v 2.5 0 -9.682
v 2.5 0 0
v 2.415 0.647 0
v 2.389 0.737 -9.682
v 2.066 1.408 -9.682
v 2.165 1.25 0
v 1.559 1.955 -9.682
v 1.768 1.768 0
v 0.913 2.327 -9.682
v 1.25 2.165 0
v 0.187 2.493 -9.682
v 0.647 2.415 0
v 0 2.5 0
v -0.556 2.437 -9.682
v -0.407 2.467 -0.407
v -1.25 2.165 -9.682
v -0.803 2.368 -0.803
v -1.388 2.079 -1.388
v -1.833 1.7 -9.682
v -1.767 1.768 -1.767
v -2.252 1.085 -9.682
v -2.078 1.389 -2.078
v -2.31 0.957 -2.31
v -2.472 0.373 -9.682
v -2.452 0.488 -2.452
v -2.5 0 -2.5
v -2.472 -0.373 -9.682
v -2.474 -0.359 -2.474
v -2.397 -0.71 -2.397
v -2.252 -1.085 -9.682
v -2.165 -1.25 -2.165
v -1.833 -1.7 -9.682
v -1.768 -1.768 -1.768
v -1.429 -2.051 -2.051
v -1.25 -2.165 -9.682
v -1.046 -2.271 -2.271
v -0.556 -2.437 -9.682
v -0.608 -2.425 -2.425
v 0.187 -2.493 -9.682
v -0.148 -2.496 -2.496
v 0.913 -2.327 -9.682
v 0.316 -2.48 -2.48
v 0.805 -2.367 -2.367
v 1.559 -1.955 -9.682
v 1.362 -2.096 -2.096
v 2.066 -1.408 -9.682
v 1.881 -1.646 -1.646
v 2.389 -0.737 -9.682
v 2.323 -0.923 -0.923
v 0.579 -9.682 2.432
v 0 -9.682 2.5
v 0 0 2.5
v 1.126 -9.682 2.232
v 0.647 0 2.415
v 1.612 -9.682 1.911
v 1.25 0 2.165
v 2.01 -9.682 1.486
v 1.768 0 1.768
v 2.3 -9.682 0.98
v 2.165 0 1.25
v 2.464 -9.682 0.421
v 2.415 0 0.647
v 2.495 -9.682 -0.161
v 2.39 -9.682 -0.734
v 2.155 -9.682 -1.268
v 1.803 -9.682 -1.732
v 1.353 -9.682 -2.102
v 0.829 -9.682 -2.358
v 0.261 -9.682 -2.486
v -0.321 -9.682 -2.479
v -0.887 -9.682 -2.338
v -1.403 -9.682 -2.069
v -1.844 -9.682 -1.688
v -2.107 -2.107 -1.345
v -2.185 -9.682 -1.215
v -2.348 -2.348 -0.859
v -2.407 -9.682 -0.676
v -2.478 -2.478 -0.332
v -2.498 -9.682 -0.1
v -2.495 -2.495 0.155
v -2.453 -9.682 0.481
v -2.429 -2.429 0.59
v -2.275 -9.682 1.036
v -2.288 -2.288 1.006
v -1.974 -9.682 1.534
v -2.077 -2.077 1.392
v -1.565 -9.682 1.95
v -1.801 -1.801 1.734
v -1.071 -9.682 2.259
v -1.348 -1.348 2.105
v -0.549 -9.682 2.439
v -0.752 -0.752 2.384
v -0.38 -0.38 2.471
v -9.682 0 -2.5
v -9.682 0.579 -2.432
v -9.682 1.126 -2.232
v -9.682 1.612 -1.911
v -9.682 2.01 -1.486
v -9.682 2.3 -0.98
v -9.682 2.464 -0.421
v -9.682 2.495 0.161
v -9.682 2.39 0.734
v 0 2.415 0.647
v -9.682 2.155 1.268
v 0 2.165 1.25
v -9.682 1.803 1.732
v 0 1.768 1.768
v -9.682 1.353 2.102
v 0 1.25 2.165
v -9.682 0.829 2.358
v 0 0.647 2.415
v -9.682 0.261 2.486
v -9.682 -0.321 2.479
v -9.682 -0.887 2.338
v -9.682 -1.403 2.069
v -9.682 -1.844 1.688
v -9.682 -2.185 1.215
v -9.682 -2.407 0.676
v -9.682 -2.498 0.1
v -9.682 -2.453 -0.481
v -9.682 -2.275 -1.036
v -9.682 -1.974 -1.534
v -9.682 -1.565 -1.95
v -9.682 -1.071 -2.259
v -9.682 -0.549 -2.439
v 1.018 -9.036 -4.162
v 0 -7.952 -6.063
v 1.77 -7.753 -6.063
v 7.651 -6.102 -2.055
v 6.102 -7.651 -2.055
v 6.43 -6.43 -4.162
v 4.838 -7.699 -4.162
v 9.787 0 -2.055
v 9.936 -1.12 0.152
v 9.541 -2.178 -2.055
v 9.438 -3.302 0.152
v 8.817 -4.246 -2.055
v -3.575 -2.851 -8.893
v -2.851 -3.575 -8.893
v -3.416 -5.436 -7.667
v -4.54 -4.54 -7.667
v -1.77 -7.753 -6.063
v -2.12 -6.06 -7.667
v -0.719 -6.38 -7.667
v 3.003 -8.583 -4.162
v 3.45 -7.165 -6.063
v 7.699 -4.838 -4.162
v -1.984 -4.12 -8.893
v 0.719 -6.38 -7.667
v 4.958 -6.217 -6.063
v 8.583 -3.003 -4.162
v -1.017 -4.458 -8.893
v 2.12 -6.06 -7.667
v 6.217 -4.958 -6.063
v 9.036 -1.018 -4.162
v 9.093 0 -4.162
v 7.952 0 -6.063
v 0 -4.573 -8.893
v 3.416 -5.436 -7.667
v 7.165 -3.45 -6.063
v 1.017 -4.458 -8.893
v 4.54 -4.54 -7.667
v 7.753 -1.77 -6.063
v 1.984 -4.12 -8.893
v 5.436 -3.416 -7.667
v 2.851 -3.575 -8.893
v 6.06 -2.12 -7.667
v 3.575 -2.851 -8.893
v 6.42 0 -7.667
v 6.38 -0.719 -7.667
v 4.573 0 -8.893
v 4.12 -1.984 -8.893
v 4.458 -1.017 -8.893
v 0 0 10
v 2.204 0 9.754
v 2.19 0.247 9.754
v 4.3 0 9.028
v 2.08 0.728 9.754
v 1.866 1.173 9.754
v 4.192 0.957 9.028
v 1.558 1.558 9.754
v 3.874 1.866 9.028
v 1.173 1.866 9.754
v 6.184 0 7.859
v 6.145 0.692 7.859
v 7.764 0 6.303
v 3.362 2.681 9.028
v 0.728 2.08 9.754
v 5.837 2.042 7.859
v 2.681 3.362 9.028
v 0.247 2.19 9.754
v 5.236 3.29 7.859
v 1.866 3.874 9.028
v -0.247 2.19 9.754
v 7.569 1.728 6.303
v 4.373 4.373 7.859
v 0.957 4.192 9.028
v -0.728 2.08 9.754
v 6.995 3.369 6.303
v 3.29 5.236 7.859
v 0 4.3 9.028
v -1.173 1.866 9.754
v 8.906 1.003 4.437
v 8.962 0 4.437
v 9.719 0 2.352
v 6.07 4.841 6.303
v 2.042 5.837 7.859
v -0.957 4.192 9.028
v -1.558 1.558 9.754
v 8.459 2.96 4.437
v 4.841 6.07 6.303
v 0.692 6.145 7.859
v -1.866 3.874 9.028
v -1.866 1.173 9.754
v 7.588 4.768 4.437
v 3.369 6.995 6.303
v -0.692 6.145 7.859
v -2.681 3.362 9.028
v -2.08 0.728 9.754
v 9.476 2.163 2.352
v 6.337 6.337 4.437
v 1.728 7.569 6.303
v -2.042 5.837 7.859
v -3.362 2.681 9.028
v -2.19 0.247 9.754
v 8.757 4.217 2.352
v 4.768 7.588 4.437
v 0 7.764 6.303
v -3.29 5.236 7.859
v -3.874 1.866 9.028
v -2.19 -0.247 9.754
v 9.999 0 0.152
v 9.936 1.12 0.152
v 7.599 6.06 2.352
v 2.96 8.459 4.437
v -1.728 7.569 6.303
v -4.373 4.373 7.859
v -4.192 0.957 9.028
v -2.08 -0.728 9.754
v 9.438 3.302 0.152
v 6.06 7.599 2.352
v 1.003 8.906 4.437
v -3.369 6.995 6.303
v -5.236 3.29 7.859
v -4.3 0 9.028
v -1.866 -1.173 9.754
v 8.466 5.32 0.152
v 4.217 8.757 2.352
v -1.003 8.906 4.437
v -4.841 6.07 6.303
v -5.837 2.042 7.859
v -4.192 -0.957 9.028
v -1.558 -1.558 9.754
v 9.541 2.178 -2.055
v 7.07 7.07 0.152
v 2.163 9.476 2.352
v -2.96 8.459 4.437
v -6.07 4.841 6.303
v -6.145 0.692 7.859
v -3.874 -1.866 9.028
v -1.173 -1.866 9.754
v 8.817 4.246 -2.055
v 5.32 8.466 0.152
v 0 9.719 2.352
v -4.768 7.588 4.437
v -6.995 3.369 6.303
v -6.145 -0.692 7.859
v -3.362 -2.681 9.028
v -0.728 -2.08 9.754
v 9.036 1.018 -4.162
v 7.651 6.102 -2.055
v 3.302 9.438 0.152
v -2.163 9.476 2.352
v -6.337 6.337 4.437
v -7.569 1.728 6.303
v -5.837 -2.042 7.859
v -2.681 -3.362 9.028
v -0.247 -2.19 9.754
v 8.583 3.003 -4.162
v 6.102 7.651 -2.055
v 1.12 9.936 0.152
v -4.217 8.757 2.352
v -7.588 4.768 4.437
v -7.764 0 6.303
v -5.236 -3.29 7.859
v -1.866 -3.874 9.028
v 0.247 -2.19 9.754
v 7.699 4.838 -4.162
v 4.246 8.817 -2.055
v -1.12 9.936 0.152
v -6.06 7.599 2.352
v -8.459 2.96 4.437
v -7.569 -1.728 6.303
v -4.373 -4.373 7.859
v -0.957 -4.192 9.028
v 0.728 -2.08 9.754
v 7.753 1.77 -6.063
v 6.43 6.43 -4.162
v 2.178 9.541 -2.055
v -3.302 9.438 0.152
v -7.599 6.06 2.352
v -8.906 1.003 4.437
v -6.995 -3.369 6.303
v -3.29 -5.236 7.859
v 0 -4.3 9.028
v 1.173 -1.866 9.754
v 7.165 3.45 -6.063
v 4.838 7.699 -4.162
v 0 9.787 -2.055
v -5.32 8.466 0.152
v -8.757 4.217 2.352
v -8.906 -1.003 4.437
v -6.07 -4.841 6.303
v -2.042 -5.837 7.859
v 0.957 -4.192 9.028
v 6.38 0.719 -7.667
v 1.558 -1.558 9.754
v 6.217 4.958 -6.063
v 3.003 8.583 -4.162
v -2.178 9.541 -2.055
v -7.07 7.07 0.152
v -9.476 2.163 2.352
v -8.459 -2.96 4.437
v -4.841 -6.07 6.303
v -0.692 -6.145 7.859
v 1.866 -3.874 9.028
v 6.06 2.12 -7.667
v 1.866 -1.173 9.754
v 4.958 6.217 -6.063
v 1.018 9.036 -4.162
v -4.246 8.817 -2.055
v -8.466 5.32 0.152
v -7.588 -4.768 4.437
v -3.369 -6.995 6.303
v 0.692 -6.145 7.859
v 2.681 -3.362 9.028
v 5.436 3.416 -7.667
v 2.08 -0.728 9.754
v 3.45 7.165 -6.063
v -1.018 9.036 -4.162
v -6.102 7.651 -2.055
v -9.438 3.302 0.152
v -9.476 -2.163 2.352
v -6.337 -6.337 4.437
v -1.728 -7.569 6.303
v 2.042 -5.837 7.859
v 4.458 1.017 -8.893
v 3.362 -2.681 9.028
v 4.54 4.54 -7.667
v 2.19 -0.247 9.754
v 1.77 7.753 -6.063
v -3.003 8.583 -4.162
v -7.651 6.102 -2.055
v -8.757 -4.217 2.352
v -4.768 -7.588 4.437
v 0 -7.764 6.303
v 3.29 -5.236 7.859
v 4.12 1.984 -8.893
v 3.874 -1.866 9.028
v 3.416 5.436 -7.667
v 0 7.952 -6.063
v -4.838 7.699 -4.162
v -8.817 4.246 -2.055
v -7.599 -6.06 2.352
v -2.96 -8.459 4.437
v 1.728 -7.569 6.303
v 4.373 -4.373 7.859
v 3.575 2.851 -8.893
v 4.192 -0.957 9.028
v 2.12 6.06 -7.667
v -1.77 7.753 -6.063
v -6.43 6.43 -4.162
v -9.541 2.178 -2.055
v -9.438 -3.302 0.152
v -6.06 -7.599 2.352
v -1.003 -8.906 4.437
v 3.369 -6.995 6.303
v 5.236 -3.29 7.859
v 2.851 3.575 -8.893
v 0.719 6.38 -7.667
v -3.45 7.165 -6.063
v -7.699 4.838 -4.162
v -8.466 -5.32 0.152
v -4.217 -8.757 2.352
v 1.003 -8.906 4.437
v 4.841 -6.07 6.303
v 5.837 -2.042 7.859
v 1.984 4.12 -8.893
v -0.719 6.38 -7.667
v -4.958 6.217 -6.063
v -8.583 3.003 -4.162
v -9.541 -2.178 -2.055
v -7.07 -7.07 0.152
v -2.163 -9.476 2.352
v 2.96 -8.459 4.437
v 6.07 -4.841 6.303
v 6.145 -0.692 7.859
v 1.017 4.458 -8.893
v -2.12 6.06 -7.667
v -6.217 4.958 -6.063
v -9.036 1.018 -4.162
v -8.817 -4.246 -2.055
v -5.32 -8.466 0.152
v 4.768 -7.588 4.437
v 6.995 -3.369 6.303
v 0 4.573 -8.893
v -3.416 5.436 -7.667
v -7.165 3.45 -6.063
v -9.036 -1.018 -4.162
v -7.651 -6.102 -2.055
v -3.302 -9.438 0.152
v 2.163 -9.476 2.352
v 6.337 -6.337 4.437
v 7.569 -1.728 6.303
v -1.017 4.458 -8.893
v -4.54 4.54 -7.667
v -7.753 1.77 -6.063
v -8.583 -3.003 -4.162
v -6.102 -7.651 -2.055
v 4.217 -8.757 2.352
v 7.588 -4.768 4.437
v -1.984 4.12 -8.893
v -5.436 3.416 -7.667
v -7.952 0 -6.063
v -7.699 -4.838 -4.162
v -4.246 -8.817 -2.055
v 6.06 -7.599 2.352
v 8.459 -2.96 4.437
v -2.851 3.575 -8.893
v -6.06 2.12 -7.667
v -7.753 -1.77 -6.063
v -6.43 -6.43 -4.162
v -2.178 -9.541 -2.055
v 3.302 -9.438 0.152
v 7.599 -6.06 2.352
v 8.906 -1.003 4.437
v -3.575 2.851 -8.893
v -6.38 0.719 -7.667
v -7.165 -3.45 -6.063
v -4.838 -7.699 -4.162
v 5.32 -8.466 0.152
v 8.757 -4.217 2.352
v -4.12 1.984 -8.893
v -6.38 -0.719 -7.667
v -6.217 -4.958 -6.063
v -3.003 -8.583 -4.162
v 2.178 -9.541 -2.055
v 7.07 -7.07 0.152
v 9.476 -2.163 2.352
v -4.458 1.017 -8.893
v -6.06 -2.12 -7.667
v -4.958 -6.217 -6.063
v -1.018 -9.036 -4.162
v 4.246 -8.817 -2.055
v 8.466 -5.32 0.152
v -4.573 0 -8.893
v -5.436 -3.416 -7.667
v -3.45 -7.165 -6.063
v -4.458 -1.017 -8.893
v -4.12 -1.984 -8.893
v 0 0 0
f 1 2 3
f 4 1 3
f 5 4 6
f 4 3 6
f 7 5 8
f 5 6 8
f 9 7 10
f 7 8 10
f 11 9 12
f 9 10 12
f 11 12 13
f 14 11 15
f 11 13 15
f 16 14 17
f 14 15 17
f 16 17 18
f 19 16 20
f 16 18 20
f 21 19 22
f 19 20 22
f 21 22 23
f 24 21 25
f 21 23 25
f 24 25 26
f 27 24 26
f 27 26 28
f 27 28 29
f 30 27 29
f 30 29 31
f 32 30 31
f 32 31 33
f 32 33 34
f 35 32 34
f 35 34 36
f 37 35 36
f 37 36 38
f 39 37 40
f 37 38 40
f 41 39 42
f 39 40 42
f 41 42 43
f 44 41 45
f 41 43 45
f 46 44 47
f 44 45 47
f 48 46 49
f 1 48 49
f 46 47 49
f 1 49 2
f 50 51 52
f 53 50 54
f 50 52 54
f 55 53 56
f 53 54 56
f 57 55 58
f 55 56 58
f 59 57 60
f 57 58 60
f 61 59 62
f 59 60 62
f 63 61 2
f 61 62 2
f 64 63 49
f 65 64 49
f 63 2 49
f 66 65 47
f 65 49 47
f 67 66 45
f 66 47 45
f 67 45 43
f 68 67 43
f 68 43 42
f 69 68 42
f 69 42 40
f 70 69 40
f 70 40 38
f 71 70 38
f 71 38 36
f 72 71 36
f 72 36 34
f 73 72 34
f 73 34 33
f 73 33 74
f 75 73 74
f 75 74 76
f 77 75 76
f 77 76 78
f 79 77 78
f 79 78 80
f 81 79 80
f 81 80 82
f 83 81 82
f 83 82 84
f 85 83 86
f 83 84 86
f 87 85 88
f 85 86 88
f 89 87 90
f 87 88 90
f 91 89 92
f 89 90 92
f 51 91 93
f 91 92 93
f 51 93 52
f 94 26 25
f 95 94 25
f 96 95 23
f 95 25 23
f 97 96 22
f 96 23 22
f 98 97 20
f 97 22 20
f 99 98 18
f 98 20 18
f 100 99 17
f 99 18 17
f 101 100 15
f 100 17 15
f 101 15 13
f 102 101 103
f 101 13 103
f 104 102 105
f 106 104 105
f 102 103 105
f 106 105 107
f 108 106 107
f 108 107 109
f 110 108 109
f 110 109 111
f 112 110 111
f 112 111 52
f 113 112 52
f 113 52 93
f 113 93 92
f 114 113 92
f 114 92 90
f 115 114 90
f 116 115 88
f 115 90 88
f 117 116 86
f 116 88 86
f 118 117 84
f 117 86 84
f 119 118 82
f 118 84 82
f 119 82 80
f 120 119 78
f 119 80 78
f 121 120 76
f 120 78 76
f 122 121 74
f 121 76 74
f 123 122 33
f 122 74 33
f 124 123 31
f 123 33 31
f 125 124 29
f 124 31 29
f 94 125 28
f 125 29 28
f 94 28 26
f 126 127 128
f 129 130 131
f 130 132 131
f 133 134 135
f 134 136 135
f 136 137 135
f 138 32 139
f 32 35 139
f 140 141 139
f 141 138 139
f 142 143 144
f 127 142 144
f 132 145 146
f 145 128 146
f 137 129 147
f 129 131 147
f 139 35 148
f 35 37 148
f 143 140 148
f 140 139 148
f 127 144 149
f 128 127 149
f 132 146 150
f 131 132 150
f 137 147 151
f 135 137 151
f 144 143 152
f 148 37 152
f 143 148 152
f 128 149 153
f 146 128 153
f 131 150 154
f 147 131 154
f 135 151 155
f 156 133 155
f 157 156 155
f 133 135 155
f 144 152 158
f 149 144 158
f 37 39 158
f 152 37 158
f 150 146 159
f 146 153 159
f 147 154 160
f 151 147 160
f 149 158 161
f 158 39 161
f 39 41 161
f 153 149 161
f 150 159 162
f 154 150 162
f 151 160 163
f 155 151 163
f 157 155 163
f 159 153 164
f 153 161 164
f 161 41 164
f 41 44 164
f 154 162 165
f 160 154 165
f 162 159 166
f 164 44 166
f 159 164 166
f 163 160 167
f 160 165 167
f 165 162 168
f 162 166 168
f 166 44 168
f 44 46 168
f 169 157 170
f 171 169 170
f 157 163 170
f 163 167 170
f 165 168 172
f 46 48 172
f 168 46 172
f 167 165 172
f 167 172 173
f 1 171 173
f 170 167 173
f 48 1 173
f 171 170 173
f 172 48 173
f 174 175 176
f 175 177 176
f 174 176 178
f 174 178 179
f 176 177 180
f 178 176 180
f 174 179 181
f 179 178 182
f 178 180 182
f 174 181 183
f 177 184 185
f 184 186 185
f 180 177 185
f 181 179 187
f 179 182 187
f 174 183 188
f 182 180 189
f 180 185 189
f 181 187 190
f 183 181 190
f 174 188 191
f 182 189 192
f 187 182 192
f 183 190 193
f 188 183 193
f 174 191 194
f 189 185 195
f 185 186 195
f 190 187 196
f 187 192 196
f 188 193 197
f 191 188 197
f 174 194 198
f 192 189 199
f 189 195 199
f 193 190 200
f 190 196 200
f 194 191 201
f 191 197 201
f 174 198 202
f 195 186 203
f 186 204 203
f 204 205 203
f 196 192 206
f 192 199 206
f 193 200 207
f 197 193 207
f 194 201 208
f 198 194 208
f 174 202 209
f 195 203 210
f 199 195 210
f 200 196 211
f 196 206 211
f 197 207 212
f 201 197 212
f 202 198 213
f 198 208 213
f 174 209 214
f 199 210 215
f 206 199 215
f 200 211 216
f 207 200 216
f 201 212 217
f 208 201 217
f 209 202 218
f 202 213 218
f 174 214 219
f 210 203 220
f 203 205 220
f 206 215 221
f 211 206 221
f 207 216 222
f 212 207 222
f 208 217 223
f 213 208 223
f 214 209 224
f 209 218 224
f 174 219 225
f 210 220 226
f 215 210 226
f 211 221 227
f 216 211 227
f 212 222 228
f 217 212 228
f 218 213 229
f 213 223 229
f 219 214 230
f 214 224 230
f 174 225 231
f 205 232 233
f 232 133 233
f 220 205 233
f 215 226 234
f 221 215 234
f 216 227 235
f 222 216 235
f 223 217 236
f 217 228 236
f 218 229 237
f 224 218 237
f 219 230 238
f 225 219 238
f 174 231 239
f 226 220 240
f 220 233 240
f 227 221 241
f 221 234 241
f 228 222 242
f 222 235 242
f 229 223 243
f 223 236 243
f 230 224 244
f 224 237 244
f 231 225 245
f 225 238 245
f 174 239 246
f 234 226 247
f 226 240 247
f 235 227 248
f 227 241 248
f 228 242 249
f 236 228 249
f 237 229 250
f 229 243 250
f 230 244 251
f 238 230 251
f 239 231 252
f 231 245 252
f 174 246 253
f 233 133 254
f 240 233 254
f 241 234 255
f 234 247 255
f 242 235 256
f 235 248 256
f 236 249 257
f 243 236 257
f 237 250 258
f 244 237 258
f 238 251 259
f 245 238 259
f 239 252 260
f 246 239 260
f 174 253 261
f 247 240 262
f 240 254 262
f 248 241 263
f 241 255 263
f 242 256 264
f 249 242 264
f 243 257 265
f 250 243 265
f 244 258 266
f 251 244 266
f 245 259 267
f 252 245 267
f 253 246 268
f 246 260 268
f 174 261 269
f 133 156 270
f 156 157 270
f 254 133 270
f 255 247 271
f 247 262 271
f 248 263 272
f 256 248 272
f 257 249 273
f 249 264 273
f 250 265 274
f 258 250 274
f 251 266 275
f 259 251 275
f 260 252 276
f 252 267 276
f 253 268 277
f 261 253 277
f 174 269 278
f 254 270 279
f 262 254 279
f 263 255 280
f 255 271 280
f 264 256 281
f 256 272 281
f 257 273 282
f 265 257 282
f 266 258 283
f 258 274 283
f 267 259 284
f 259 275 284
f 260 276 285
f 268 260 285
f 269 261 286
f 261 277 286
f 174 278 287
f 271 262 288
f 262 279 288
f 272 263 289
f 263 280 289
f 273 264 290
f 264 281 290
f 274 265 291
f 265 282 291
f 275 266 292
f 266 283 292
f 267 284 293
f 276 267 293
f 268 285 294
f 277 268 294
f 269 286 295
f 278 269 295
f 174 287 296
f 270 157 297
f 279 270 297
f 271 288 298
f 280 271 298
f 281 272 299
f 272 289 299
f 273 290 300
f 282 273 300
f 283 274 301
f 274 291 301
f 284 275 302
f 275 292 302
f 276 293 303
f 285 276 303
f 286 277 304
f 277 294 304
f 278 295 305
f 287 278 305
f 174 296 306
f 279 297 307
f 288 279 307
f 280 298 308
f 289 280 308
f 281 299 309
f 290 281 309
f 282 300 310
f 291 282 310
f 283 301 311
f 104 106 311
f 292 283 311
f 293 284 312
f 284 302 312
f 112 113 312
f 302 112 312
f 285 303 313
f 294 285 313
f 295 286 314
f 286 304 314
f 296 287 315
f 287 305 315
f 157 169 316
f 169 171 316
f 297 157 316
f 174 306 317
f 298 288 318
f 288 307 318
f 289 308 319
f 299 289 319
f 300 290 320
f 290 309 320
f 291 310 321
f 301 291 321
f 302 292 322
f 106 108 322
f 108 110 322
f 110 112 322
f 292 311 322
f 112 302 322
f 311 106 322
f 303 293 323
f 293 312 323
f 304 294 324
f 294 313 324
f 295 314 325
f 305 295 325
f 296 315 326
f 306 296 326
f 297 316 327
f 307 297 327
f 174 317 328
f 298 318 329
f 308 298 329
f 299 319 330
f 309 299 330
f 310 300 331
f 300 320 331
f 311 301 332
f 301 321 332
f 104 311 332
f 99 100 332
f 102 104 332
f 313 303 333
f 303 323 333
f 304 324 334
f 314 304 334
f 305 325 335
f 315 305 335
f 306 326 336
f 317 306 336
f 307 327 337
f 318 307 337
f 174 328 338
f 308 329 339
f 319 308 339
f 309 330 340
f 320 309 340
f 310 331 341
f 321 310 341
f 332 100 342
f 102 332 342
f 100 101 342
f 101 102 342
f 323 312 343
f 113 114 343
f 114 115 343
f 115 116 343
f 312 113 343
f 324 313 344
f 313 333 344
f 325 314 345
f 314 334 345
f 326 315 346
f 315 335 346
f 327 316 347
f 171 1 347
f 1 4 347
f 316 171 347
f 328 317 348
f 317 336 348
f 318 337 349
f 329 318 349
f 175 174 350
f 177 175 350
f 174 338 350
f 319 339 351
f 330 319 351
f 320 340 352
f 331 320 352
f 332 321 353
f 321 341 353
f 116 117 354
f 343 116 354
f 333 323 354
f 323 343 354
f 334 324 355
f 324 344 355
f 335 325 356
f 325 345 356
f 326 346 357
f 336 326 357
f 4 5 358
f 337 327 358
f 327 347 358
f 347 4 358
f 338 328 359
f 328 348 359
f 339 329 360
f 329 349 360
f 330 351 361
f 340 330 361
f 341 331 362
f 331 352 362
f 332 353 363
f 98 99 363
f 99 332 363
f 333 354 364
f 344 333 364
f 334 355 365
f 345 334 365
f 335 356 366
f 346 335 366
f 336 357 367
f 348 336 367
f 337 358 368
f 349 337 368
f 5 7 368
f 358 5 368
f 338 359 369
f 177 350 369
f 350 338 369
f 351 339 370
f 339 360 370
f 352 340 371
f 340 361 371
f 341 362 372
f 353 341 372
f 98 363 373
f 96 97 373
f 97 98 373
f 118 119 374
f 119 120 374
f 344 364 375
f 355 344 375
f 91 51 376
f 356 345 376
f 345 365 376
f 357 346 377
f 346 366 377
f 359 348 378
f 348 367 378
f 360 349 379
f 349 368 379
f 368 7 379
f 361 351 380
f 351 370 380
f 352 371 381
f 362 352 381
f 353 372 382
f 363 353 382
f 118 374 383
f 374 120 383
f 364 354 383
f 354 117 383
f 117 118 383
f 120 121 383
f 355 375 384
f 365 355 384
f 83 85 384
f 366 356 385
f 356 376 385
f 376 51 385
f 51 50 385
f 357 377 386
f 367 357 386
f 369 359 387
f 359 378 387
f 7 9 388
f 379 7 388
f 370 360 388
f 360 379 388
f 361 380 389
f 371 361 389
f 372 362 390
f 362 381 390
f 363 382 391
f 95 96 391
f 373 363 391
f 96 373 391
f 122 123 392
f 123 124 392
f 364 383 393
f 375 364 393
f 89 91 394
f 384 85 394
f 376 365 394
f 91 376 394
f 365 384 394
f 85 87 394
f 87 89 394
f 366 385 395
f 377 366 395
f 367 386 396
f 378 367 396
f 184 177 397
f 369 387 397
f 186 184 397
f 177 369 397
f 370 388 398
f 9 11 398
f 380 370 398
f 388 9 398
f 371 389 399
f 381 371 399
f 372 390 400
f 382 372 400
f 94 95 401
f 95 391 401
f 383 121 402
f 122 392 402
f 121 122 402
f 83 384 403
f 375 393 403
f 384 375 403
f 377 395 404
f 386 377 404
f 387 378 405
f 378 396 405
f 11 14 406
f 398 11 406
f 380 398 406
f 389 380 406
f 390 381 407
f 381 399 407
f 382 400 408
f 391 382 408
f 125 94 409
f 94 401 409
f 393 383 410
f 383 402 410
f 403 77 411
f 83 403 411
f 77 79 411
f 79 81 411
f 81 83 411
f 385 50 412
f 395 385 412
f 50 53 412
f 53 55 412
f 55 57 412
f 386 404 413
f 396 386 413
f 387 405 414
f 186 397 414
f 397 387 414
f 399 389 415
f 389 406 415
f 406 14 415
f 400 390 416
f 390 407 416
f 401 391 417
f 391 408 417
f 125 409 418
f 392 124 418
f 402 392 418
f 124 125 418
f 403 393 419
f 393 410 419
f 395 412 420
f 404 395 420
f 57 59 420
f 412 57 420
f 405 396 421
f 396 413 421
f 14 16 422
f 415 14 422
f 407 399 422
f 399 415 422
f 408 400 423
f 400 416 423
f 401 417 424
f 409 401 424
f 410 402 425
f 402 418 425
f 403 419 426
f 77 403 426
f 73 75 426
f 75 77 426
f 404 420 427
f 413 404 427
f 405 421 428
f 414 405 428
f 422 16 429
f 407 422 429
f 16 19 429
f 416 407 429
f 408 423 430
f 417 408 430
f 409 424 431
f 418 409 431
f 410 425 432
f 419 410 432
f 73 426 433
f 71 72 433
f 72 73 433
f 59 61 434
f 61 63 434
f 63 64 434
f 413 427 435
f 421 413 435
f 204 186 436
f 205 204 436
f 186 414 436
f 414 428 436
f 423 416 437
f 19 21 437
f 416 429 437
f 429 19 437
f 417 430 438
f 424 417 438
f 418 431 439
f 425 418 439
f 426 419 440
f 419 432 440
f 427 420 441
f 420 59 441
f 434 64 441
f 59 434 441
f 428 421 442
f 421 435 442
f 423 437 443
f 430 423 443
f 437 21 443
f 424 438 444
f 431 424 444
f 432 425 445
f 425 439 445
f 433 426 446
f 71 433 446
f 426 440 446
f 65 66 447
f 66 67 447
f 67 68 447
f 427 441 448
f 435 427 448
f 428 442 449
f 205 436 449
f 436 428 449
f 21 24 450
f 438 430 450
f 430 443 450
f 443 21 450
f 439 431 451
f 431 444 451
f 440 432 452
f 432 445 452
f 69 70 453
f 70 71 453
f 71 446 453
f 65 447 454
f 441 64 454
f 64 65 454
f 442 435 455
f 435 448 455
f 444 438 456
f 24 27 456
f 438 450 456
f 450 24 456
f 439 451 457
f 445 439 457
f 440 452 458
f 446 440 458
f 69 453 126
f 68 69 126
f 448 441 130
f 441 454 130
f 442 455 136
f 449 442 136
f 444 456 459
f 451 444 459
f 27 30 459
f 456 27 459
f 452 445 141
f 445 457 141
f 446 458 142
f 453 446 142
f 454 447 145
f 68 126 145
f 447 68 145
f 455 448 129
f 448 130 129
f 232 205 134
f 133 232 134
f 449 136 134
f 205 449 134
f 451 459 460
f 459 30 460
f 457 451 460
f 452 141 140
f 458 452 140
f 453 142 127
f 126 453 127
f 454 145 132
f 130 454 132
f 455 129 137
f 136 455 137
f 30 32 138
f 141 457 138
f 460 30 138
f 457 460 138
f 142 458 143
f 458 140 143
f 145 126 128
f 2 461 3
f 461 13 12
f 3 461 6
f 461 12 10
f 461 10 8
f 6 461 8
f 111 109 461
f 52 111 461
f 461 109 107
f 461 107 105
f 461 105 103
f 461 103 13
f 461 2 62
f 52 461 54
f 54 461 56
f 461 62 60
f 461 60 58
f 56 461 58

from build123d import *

# Parameters (mm, degrees)
SKETCH_2_R          = 2.5
CUT_EXTRUDE_1_DEPTH = 18.320508076
SKETCH_3_R          = 2.5
CUT_EXTRUDE_2_DEPTH = 18.320508076
SKETCH_4_R          = 2.5
CUT_EXTRUDE_3_DEPTH = 18.320508076


with BuildPart() as part:
    # 草图1 → 旋转1 (revolve)
    with BuildSketch(Plane(origin=(0, 0, 0), x_dir=(1, 0, 0), z_dir=(0, 1, 0))):
        with BuildLine():
            Line((0, 10), (0, -10))
            ThreePointArc((0, -10), (10, 0), (0, 10))
        make_face()
    revolve(axis=Axis((0, 0, -16.747658197), (0, 0, 1)))

    # 草图2 → 切除-拉伸1 (cut, through all)
    with BuildSketch(Plane(origin=(0, 0, 0), x_dir=(1, 0, 0), z_dir=(0, 1, 0))):
        with Locations(Location((0, 0, 0), (0, 0, 270))):
            Circle(SKETCH_2_R)
    extrude(amount=-CUT_EXTRUDE_1_DEPTH, mode=Mode.SUBTRACT)

    # 草图3 → 切除-拉伸2 (cut, through all)
    with BuildSketch(Plane(origin=(0, 0, 0), x_dir=(0, 0, -1), z_dir=(1, 0, 0))):
        Circle(SKETCH_3_R)
    extrude(amount=-CUT_EXTRUDE_2_DEPTH, mode=Mode.SUBTRACT)

    # 草图4 → 切除-拉伸3 (cut, through all)
    with BuildSketch(Plane.XY):
        Circle(SKETCH_4_R)
    extrude(amount=-CUT_EXTRUDE_3_DEPTH, mode=Mode.SUBTRACT)


solid = part.part
